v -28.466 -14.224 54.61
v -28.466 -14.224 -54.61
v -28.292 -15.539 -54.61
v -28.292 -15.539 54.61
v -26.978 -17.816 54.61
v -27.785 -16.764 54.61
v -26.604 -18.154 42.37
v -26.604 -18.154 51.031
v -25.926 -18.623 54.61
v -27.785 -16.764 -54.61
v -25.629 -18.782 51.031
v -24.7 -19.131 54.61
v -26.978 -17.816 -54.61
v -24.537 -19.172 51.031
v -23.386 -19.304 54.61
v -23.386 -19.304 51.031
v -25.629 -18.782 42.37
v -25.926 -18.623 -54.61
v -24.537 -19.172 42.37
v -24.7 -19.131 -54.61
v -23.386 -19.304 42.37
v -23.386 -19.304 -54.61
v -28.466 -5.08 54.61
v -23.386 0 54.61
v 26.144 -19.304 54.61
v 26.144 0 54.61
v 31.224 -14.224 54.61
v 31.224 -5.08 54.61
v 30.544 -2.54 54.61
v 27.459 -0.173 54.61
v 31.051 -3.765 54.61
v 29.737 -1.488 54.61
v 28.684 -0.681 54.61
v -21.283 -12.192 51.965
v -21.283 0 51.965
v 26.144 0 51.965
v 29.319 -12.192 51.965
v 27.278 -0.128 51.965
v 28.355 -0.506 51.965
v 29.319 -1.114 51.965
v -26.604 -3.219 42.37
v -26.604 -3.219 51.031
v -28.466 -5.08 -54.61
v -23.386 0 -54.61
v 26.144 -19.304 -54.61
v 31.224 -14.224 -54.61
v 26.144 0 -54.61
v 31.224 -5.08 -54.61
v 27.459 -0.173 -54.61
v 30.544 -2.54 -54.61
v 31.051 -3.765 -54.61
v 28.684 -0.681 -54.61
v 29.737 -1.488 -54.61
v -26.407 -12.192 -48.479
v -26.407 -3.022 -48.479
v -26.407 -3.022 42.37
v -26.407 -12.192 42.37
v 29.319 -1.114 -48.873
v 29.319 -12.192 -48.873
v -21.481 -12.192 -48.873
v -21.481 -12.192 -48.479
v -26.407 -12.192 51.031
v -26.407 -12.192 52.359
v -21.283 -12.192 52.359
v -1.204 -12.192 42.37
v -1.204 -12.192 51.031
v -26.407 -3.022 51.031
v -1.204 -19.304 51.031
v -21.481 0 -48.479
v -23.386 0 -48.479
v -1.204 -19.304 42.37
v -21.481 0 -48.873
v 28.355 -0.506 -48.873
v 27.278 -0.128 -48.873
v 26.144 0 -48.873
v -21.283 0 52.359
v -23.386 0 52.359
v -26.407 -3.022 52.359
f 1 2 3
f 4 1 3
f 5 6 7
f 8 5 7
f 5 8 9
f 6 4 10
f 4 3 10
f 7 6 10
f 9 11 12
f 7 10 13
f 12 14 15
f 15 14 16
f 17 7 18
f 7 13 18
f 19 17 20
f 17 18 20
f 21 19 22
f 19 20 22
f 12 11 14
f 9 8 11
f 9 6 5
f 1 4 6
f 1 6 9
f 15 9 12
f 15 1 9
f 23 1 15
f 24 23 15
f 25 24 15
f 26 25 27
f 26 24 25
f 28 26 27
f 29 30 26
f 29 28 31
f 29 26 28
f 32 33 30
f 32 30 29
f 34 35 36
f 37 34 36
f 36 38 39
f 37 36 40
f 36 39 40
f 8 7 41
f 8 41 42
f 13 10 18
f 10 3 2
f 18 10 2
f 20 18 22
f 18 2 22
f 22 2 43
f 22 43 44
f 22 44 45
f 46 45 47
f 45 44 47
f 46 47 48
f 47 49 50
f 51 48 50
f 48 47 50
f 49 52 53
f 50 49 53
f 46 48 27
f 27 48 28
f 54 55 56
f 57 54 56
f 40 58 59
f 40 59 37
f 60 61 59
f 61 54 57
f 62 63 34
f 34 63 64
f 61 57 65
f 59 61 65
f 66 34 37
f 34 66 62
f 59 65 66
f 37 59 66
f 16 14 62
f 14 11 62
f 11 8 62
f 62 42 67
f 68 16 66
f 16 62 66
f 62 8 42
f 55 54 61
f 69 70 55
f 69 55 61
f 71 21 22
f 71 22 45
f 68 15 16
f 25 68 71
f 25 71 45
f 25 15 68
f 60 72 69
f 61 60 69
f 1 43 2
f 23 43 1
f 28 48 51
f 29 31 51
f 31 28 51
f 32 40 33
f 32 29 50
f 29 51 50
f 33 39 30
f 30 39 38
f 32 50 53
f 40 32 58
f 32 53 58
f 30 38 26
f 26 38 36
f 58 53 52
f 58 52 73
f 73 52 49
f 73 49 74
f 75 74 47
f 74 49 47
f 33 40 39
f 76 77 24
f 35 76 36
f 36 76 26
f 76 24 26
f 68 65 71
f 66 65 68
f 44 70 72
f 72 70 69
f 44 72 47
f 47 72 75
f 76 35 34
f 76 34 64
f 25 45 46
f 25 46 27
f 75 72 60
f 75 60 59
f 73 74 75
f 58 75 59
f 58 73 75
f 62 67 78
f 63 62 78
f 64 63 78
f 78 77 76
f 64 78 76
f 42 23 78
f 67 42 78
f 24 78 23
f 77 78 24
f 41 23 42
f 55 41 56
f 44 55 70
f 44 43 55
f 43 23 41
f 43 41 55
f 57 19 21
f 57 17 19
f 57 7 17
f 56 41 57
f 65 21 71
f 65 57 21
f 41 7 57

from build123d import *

# Parameters (mm, degrees)
F0_W         = 59.69
F0_H         = 109.22
F1_DEPTH     = 19.304
F2_W         = 50.8
F2_H         = 100.838
F3_DEPTH     = 12.192
F4_W         = 5.1237940788
F4_H         = 100.838
F5_DEPTH     = 12.192
F6_W         = 25.4
F6_H         = 8.6614
F7_DEPTH     = 45.974
F8_T1_DEPTH  = 134.62
F9_SIZE      = 5.08
F10_T1_DEPTH = 134.62
F11_T1_DEPTH = 135.3482991577


# Not quite as in the source:
# - a fillet or chamfer that OpenCascade refuses, or shapes differently, is made with other operations: its cross-section is extruded or revolved along the edge and cut away or added


with BuildPart() as f1:
    # F0 (on Front) → F1 (new body)
    with BuildSketch(Plane.XZ):
        with Locations((1.3794824481, 0)):
            Rectangle(F0_W, F0_H)
    extrude(amount=F1_DEPTH)

    # F2 (on Front) → F3 (cut)
    with BuildSketch(Plane.XZ):
        with Locations((3.9194825381, 1.5458958449)):
            Rectangle(F2_W, F2_H)
    extrude(amount=F3_DEPTH, mode=Mode.SUBTRACT)

    # F4 (on Front) → F5 (cut)
    with BuildSketch(Plane.XZ):
        with Locations((-23.8453447819, 1.9400352838)):
            Rectangle(F4_W, F4_H)
    extrude(amount=F5_DEPTH, mode=Mode.SUBTRACT)

    # F6 (on Front) → F7 (cut)
    with BuildSketch(Plane.XZ):
        with Locations((-13.9043106094, 46.7005276281)):
            Rectangle(F6_W, F6_H)
    extrude(amount=F7_DEPTH, mode=Mode.SUBTRACT)

    # F8: fillet of radius 5.08 on 1 edges, made by hand

    # F8_s2 → F8_t1 (cut)
    with BuildSketch(Plane.XY.offset(-67.31)):
        with BuildLine():
            ThreePointArc((-28.4655175519, -14.224), (-26.9776200003, -17.8161024484), (-23.3855175519, -19.304))
            Line((-23.3855175519, -19.304), (-28.4655175519, -19.304))
            Line((-28.4655175519, -19.304), (-28.4655175519, -14.224))
        make_face()
    extrude(amount=F8_T1_DEPTH, mode=Mode.SUBTRACT)

    # F9
    f9_edges = [f1.edges().sort_by_distance(p)[0] for p in [
        (31.224482, -19.304, 0),
    ]]
    chamfer(f9_edges, length=F9_SIZE)

    # F10: fillet of radius 5.08 on 1 edges, made by hand

    # F10_s2 → F10_t1 (cut)
    with BuildSketch(Plane.XY.offset(-67.31)):
        with BuildLine():
            ThreePointArc((31.2244824481, -5.08), (29.7365848965, -1.4878975516), (26.1444824481, 0))
            Line((26.1444824481, 0), (31.2244824481, 0))
            Line((31.2244824481, 0), (31.2244824481, -5.08))
        make_face()
    extrude(amount=F10_T1_DEPTH, mode=Mode.SUBTRACT)

    # F11: chamfer of 5.08 on 1 edges, made by hand

    # F11_s2 → F11_t1 (cut)
    with BuildSketch(Plane.XY.offset(-67.6741495789)):
        Polygon((-28.4655175519, -5.08), (-23.3855175519, 0), (-28.4655175519, 0), align=None)
    extrude(amount=F11_T1_DEPTH, mode=Mode.SUBTRACT)


solid = f1.part
